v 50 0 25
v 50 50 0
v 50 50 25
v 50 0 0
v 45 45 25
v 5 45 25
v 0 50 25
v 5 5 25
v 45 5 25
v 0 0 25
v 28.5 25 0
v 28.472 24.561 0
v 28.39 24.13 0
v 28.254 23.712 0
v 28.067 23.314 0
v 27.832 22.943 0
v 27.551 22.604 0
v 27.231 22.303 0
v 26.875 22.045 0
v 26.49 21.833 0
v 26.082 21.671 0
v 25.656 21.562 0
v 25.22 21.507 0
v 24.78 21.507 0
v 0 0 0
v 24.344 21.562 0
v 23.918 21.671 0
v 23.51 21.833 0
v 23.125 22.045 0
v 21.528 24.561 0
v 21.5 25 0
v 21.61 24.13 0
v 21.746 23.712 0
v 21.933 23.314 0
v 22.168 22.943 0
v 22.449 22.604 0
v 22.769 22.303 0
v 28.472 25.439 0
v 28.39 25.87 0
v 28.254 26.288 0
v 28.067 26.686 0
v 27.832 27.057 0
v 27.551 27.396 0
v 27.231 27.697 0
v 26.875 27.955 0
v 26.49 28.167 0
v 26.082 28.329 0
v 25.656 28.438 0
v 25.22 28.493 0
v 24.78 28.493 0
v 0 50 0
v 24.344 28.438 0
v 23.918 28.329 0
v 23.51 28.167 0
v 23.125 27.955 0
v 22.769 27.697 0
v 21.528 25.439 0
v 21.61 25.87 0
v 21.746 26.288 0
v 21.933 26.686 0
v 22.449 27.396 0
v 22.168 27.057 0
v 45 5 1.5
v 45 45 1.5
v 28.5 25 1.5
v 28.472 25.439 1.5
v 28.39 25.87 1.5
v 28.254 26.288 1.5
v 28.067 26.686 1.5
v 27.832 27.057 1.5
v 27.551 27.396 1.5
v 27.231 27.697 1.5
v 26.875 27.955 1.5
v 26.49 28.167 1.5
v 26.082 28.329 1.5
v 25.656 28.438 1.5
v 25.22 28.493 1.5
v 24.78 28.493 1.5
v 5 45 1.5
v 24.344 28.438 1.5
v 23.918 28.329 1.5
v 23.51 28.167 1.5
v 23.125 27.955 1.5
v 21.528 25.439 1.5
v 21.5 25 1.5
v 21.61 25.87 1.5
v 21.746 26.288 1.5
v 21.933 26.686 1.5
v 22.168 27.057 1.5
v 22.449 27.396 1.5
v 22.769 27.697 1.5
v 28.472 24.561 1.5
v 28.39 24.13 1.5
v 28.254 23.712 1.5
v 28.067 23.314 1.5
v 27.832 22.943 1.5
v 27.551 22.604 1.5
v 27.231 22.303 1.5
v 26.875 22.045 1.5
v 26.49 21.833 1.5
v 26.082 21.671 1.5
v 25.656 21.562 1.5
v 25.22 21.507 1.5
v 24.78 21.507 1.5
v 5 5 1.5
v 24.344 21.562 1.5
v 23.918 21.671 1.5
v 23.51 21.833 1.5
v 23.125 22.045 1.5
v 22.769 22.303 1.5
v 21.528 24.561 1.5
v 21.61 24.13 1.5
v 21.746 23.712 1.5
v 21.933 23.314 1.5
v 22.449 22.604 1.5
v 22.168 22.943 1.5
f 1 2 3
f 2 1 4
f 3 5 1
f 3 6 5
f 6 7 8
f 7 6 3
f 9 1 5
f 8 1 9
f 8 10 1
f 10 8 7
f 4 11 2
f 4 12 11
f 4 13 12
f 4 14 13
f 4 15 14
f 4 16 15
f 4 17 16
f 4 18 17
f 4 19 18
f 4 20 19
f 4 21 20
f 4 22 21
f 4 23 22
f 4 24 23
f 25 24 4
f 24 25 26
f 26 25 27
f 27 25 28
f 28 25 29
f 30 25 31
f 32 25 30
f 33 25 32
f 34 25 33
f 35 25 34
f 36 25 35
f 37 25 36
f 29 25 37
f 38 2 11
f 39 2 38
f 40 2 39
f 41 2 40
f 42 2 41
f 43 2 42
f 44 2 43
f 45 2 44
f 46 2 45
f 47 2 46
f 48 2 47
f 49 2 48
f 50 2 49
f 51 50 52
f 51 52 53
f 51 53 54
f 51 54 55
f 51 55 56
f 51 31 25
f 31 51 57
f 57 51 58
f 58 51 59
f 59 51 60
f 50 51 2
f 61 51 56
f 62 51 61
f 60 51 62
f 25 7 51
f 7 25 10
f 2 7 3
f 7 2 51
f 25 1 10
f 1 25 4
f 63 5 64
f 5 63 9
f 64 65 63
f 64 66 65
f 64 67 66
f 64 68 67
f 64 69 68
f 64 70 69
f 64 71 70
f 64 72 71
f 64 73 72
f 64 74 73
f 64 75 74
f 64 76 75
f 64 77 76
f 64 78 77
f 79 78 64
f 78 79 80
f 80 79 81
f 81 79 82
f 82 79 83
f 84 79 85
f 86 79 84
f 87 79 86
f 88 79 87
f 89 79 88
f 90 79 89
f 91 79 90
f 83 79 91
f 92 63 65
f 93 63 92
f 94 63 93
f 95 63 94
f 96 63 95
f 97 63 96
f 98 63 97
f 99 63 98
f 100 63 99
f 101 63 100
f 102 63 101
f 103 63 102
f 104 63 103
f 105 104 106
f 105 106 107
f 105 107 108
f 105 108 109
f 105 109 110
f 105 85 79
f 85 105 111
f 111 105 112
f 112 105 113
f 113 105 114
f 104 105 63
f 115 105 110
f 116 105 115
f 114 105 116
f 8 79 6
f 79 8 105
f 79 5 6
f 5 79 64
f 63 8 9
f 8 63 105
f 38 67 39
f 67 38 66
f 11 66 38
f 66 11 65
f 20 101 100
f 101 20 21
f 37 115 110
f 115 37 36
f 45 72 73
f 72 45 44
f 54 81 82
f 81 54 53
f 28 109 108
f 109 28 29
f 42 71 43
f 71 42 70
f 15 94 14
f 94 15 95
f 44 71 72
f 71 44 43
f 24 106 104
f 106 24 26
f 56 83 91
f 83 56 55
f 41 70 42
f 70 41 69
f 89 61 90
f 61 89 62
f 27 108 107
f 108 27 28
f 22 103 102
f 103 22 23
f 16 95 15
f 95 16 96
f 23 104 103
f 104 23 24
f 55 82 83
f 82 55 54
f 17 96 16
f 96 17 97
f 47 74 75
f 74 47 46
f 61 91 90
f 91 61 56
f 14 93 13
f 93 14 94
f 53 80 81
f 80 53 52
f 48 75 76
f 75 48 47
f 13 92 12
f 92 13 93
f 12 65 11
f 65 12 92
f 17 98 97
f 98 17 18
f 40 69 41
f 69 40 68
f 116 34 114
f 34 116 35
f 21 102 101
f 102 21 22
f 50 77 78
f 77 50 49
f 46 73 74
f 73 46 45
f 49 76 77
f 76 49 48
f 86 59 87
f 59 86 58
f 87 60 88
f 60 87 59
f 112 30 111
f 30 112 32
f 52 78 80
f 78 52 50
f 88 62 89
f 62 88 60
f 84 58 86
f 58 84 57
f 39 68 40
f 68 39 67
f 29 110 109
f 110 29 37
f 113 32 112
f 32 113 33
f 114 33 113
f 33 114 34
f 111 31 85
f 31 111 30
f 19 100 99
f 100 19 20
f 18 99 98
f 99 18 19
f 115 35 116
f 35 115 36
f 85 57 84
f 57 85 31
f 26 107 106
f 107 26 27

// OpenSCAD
difference(){
    cube([50,50,25]);
    translate([5,5,1.5]) cube([40,40,25]);
    translate([25,25,-1]) cylinder(d=7,h=3,$fn=50);
}
